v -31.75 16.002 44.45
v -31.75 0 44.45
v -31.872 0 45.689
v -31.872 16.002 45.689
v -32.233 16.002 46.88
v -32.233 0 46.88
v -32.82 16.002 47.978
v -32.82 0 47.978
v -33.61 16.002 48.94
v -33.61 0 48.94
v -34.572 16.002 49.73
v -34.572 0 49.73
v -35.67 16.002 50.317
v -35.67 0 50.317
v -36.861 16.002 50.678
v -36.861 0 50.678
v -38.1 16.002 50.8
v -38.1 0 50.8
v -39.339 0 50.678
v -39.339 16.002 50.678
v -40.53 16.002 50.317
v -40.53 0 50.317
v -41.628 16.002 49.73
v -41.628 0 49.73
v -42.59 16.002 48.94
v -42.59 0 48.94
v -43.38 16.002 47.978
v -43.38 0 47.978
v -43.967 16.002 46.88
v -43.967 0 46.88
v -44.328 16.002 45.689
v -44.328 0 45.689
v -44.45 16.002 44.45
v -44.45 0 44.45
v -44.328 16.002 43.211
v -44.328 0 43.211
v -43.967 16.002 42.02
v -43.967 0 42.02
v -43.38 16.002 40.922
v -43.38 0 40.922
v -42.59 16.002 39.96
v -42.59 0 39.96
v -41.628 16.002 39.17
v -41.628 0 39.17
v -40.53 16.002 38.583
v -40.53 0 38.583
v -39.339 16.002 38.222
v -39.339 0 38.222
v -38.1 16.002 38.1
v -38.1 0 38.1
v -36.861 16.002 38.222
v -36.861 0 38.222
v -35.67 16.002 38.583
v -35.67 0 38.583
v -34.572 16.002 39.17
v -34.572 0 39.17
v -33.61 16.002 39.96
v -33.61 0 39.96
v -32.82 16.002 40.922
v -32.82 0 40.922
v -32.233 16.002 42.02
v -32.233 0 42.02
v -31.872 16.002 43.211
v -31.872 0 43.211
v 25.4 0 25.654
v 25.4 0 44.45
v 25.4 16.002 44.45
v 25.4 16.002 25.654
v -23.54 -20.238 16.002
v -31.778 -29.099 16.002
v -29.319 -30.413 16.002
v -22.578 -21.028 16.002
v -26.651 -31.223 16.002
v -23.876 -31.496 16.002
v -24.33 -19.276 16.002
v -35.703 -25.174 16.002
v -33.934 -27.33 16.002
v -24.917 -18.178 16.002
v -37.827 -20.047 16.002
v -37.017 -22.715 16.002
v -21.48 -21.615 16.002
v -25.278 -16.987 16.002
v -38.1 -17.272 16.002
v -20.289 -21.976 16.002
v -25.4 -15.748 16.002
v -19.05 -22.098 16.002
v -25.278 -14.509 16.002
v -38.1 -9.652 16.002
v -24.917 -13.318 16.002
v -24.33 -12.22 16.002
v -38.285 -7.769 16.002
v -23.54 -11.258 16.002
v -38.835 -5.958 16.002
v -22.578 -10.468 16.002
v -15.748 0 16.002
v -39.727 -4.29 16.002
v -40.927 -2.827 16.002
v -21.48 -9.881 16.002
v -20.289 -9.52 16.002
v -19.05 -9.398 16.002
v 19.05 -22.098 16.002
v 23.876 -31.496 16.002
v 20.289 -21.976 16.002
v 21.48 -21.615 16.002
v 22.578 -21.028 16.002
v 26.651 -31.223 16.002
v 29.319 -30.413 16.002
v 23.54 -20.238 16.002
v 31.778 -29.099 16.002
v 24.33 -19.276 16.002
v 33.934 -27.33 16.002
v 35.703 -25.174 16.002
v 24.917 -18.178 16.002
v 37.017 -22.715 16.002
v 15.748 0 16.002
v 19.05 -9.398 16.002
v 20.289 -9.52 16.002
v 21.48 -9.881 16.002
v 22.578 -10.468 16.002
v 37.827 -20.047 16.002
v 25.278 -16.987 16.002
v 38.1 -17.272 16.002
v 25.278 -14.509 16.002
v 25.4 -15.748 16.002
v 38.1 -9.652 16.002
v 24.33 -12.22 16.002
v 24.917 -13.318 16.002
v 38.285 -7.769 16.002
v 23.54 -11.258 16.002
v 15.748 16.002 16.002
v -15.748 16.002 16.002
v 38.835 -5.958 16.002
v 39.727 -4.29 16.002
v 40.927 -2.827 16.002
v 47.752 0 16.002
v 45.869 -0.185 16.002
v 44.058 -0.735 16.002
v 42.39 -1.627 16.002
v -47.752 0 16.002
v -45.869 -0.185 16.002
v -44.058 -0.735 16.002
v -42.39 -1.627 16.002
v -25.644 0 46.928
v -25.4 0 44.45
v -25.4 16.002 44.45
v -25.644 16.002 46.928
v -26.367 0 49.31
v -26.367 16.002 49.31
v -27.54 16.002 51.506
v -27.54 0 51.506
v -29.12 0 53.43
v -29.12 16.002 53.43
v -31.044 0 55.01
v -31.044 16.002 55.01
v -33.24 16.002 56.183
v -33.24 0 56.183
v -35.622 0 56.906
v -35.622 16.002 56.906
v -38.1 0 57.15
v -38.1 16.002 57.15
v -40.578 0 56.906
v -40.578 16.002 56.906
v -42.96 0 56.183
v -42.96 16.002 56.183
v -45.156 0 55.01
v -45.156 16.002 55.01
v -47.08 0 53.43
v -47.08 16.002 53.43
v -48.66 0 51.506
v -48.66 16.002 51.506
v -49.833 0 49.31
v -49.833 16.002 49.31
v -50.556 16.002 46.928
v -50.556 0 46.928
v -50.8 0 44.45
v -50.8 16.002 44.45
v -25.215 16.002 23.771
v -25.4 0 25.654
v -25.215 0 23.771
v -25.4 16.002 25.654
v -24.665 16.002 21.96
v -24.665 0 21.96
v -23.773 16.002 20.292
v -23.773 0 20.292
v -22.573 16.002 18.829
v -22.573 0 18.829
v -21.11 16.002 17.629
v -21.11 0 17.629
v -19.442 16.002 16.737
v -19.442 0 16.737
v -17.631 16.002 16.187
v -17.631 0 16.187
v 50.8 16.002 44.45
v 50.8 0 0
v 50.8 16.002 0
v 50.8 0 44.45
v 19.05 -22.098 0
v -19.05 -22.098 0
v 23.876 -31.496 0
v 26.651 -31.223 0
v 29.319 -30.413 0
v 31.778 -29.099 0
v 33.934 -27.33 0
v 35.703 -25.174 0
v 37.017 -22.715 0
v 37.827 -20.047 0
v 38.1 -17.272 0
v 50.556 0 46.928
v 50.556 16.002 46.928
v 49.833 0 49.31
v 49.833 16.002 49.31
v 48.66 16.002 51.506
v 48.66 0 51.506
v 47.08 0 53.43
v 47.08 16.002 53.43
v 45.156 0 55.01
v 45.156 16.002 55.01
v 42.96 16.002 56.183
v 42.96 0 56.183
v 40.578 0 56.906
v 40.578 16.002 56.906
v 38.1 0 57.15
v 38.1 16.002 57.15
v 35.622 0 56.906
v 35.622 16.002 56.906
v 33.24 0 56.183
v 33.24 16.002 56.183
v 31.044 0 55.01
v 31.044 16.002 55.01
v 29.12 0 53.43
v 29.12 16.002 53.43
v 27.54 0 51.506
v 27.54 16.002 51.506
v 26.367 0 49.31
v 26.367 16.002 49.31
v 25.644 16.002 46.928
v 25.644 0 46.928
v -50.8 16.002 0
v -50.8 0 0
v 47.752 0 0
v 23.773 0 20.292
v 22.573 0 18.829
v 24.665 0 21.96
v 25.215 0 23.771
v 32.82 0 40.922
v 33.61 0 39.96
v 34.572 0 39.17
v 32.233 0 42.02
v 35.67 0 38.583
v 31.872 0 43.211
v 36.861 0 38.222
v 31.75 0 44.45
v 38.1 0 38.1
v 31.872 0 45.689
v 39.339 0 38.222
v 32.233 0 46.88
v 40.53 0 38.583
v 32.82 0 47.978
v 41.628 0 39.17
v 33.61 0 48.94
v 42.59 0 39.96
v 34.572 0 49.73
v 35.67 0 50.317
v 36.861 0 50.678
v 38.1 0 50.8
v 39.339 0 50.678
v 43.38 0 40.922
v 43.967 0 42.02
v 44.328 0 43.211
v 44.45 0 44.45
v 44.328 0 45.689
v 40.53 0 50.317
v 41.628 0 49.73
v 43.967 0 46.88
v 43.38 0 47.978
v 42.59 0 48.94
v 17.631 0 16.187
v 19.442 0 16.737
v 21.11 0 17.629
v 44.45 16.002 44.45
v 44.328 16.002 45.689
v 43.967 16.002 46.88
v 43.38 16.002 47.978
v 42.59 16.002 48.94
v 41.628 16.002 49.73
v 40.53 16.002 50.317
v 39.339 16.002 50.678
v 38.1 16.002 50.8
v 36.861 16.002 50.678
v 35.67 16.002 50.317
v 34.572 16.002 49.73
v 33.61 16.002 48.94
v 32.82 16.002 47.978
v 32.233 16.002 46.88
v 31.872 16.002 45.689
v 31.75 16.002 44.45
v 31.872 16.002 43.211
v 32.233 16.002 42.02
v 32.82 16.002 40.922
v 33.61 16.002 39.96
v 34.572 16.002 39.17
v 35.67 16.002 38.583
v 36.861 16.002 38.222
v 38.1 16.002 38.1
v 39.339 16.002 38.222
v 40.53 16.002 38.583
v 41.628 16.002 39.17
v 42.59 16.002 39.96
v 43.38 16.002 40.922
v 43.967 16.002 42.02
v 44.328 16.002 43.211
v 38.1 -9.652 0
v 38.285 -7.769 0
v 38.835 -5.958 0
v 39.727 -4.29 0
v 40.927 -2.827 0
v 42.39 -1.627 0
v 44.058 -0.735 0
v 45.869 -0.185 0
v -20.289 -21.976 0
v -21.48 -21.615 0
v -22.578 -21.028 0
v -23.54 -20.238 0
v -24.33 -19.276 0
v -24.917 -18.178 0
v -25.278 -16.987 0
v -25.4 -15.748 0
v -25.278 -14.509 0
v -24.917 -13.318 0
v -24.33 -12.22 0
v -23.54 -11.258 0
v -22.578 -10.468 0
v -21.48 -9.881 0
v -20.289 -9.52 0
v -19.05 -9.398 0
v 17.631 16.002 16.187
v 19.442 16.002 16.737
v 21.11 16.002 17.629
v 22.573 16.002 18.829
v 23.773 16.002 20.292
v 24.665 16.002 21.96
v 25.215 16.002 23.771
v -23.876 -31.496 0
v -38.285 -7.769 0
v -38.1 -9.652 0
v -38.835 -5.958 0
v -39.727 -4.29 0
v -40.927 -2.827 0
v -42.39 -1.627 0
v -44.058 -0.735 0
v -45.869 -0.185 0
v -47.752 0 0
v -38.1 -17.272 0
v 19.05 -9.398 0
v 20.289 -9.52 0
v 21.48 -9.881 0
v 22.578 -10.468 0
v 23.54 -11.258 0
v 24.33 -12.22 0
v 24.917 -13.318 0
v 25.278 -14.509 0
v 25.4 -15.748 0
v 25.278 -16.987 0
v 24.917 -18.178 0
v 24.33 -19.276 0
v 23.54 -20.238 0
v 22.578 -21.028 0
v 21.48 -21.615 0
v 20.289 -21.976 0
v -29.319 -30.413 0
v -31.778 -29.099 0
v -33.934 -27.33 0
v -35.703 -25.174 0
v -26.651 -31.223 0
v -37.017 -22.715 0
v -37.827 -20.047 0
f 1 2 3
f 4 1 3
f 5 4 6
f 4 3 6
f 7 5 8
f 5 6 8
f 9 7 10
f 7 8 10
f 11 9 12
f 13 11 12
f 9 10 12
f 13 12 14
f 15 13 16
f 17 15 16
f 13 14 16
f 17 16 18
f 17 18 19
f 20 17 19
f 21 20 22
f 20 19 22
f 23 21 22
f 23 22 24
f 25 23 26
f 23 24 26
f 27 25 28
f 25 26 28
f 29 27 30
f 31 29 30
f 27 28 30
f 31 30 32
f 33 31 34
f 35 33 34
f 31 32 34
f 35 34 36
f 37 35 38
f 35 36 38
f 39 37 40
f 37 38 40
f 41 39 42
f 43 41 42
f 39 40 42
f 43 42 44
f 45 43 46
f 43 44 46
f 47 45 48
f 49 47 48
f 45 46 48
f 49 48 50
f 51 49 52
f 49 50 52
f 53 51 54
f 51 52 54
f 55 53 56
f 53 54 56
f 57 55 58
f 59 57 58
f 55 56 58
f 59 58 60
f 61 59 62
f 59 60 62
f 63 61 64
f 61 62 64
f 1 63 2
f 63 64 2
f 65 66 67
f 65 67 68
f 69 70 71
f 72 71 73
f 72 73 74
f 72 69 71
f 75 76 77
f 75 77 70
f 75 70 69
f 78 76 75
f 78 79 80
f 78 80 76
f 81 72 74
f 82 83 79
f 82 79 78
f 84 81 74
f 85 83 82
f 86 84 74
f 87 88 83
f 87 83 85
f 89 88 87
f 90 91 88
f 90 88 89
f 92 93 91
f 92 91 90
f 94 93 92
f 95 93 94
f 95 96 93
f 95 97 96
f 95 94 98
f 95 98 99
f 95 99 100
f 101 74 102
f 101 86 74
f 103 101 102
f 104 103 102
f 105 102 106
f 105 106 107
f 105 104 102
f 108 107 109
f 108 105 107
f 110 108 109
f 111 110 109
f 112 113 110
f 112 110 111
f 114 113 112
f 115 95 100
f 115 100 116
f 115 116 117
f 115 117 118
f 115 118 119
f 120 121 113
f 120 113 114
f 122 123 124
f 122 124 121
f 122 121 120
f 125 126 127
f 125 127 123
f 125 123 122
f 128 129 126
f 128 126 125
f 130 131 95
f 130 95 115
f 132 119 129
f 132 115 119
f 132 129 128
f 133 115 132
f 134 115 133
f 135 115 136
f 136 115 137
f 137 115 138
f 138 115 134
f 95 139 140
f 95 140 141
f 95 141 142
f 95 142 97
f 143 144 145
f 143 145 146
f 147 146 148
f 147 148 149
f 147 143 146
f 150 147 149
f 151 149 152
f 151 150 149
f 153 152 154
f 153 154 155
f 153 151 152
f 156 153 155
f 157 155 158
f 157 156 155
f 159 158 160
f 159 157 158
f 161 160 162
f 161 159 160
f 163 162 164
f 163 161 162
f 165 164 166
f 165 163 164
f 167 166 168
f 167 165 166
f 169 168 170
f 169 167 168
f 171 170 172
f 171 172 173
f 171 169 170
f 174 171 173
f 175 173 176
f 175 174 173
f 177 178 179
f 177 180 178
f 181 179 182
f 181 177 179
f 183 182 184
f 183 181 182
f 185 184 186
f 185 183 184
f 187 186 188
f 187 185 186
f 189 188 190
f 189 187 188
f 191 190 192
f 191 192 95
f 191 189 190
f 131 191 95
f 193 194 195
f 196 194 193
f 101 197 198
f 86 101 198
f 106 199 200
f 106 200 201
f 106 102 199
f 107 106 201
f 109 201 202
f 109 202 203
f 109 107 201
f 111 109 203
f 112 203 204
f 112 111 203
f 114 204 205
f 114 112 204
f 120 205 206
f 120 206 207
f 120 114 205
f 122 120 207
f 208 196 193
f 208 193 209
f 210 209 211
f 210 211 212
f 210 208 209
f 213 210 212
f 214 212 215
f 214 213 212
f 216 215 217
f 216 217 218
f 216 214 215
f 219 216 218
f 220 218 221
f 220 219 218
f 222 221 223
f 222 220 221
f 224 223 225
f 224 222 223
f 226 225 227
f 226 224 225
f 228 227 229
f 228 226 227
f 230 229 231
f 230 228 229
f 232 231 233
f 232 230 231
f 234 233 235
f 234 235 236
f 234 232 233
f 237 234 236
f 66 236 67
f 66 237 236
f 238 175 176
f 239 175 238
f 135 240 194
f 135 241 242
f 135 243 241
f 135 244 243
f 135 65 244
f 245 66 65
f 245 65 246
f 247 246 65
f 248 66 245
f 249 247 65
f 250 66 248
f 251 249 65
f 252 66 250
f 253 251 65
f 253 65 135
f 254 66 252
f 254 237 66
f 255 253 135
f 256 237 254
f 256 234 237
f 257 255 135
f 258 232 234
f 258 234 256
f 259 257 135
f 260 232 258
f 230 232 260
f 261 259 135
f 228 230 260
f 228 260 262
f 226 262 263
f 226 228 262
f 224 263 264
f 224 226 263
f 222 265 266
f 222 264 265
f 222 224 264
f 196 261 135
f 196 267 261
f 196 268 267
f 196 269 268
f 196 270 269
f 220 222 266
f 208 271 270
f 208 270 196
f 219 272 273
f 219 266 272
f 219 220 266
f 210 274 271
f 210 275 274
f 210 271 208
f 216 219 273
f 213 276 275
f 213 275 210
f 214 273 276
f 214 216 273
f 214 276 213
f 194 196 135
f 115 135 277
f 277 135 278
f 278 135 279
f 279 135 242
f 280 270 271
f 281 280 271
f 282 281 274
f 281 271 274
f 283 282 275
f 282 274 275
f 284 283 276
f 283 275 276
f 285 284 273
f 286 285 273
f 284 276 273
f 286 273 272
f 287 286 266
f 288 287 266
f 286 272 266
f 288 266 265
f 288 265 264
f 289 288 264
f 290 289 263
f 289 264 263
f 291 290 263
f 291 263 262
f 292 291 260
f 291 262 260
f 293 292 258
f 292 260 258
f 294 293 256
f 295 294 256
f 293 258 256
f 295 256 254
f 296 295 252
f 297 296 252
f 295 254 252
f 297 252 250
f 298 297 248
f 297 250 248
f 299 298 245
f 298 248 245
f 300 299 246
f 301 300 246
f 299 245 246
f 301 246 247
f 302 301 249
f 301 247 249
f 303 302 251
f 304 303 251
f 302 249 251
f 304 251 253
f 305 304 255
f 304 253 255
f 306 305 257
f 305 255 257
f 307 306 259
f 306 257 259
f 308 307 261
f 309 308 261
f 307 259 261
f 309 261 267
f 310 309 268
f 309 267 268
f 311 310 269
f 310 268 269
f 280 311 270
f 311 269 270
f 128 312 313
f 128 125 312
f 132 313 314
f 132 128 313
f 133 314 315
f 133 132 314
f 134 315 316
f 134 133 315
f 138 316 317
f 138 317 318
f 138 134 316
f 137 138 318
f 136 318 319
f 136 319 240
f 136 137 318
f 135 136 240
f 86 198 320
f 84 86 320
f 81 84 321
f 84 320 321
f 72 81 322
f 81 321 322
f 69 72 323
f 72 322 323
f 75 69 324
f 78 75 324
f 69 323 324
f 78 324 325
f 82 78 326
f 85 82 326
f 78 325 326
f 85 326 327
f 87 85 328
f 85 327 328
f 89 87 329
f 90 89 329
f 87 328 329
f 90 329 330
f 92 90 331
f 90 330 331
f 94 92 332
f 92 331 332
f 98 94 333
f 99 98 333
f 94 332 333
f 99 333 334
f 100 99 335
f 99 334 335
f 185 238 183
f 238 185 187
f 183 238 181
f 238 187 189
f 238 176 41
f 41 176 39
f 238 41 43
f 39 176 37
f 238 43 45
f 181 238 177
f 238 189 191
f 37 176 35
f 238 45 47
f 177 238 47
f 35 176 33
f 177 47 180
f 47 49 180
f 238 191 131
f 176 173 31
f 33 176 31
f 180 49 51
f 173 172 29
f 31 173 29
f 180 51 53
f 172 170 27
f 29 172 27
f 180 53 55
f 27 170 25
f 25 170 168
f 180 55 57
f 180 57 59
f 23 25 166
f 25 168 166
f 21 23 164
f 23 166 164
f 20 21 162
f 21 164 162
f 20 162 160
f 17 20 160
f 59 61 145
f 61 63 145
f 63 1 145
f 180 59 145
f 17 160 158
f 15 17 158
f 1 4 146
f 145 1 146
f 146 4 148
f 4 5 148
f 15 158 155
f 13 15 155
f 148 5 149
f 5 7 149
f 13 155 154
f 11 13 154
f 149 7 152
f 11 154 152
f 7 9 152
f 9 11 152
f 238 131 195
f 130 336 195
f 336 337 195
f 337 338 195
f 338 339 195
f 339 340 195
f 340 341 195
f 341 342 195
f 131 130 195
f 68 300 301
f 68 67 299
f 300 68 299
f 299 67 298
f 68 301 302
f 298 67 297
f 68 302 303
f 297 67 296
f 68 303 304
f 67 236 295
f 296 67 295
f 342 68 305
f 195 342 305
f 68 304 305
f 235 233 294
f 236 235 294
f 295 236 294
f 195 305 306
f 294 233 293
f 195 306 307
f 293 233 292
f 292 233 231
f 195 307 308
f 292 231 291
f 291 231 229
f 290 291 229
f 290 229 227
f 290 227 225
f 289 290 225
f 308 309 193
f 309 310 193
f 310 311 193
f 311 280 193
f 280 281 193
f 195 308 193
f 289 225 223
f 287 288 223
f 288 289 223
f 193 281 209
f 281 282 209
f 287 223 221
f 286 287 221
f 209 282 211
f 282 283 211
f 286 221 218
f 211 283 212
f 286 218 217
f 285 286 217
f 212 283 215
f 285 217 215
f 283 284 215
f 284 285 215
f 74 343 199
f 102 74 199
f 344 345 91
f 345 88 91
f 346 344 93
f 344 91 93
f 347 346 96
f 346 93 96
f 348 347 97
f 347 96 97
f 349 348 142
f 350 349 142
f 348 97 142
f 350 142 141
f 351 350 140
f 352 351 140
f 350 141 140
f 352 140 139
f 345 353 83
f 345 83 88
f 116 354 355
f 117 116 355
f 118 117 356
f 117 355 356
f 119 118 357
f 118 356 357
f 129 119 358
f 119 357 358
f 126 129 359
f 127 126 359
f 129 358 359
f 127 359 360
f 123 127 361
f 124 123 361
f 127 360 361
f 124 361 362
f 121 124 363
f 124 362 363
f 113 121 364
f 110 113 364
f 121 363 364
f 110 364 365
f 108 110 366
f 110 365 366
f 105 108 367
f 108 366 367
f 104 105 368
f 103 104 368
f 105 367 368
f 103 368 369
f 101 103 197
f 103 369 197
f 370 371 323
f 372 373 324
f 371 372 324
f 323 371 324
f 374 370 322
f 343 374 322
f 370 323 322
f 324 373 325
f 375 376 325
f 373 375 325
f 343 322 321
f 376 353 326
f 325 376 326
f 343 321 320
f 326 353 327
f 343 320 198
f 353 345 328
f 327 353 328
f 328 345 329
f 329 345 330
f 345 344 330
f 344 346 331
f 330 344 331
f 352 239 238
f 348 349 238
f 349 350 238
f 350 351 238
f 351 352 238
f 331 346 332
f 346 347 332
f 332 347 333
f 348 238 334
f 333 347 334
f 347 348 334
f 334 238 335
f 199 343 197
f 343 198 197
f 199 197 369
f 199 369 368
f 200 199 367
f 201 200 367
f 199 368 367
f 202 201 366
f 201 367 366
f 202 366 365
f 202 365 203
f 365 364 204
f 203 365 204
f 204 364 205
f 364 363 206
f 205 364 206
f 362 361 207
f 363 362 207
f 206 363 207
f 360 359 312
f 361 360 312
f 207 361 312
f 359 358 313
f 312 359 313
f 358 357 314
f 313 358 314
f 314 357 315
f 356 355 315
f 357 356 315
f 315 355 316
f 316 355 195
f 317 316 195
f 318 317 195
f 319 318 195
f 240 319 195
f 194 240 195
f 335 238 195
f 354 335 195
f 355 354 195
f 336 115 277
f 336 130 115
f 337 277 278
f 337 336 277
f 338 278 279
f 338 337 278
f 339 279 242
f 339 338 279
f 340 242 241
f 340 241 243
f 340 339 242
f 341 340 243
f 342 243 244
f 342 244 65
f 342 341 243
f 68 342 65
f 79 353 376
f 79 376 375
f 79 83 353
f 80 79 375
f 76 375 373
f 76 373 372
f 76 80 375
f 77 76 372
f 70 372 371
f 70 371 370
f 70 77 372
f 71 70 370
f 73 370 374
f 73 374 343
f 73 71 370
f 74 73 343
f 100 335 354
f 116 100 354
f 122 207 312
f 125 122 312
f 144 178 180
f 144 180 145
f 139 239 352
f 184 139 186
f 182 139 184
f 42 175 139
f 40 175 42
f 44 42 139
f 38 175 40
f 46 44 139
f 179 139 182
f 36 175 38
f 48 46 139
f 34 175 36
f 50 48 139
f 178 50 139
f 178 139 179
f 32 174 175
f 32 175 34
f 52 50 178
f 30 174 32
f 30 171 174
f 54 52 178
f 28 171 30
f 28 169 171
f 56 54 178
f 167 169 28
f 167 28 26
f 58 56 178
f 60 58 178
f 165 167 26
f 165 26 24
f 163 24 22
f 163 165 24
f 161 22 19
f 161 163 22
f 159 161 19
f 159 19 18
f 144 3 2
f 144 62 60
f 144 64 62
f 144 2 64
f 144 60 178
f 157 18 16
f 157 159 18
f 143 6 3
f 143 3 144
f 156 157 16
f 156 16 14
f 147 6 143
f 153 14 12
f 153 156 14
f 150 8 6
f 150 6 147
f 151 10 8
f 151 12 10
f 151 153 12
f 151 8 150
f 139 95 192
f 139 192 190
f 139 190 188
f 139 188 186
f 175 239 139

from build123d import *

# Parameters (mm, degrees)
F0_R     = 6.35
F1_DEPTH = 16.002
F2_R     = 9.652
F3_W     = 76.2
F3_H     = 31.496
F4_DEPTH = 16.002
F5_R     = 14.224
F6_R     = 9.652


with BuildPart() as f1:
    # F0 (on Front) → F1 (new body)
    with BuildSketch(Plane.XZ):
        with BuildLine():
            Line((-50.8, 44.45), (-50.8, 0))
            Line((-50.8, 0), (50.8, 0))
            Line((50.8, 0), (50.8, 44.45))
            ThreePointArc((50.8, 44.45), (38.1, 57.15), (25.4, 44.45))
            Line((25.4, 44.45), (25.4, 16.002))
            Line((25.4, 16.002), (-25.4, 16.002))
            Line((-25.4, 16.002), (-25.4, 44.45))
            ThreePointArc((-25.4, 44.45), (-38.1, 57.15), (-50.8, 44.45))
        make_face()
        with Locations((-38.1, 44.45)):
            Circle(F0_R, mode=Mode.SUBTRACT)
        with Locations((38.1, 44.45)):
            Circle(F0_R, mode=Mode.SUBTRACT)
    extrude(amount=-F1_DEPTH)

    # F2
    f2_edges = [f1.edges().sort_by_distance(p)[0] for p in [
        (-25.4, 8.001, 16.002),
        (25.4, 8.001, 16.002),
    ]]
    fillet(f2_edges, radius=F2_R)

    # F3 (on Top) → F4 (join)
    with BuildSketch(Plane.XY):
        with Locations((0, -15.748)):
            Rectangle(F3_W, F3_H)
        with BuildLine():
            ThreePointArc((-19.05, -22.098), (-25.4, -15.748), (-19.05, -9.398))
            Line((-19.05, -9.398), (19.05, -9.398))
            ThreePointArc((19.05, -9.398), (25.4, -15.748), (19.05, -22.098))
            Line((19.05, -22.098), (-19.05, -22.098))
        make_face(mode=Mode.SUBTRACT)
    extrude(amount=F4_DEPTH)

    # F5
    f5_edges = [f1.edges().sort_by_distance(p)[0] for p in [
        (38.1, -31.496, 8.001),
        (-38.1, -31.496, 8.001),
    ]]
    fillet(f5_edges, radius=F5_R)

    # F6
    f6_edges = [f1.edges().sort_by_distance(p)[0] for p in [
        (38.1, 0, 8.001),
        (-38.1, 0, 8.001),
    ]]
    fillet(f6_edges, radius=F6_R)


solid = f1.part
